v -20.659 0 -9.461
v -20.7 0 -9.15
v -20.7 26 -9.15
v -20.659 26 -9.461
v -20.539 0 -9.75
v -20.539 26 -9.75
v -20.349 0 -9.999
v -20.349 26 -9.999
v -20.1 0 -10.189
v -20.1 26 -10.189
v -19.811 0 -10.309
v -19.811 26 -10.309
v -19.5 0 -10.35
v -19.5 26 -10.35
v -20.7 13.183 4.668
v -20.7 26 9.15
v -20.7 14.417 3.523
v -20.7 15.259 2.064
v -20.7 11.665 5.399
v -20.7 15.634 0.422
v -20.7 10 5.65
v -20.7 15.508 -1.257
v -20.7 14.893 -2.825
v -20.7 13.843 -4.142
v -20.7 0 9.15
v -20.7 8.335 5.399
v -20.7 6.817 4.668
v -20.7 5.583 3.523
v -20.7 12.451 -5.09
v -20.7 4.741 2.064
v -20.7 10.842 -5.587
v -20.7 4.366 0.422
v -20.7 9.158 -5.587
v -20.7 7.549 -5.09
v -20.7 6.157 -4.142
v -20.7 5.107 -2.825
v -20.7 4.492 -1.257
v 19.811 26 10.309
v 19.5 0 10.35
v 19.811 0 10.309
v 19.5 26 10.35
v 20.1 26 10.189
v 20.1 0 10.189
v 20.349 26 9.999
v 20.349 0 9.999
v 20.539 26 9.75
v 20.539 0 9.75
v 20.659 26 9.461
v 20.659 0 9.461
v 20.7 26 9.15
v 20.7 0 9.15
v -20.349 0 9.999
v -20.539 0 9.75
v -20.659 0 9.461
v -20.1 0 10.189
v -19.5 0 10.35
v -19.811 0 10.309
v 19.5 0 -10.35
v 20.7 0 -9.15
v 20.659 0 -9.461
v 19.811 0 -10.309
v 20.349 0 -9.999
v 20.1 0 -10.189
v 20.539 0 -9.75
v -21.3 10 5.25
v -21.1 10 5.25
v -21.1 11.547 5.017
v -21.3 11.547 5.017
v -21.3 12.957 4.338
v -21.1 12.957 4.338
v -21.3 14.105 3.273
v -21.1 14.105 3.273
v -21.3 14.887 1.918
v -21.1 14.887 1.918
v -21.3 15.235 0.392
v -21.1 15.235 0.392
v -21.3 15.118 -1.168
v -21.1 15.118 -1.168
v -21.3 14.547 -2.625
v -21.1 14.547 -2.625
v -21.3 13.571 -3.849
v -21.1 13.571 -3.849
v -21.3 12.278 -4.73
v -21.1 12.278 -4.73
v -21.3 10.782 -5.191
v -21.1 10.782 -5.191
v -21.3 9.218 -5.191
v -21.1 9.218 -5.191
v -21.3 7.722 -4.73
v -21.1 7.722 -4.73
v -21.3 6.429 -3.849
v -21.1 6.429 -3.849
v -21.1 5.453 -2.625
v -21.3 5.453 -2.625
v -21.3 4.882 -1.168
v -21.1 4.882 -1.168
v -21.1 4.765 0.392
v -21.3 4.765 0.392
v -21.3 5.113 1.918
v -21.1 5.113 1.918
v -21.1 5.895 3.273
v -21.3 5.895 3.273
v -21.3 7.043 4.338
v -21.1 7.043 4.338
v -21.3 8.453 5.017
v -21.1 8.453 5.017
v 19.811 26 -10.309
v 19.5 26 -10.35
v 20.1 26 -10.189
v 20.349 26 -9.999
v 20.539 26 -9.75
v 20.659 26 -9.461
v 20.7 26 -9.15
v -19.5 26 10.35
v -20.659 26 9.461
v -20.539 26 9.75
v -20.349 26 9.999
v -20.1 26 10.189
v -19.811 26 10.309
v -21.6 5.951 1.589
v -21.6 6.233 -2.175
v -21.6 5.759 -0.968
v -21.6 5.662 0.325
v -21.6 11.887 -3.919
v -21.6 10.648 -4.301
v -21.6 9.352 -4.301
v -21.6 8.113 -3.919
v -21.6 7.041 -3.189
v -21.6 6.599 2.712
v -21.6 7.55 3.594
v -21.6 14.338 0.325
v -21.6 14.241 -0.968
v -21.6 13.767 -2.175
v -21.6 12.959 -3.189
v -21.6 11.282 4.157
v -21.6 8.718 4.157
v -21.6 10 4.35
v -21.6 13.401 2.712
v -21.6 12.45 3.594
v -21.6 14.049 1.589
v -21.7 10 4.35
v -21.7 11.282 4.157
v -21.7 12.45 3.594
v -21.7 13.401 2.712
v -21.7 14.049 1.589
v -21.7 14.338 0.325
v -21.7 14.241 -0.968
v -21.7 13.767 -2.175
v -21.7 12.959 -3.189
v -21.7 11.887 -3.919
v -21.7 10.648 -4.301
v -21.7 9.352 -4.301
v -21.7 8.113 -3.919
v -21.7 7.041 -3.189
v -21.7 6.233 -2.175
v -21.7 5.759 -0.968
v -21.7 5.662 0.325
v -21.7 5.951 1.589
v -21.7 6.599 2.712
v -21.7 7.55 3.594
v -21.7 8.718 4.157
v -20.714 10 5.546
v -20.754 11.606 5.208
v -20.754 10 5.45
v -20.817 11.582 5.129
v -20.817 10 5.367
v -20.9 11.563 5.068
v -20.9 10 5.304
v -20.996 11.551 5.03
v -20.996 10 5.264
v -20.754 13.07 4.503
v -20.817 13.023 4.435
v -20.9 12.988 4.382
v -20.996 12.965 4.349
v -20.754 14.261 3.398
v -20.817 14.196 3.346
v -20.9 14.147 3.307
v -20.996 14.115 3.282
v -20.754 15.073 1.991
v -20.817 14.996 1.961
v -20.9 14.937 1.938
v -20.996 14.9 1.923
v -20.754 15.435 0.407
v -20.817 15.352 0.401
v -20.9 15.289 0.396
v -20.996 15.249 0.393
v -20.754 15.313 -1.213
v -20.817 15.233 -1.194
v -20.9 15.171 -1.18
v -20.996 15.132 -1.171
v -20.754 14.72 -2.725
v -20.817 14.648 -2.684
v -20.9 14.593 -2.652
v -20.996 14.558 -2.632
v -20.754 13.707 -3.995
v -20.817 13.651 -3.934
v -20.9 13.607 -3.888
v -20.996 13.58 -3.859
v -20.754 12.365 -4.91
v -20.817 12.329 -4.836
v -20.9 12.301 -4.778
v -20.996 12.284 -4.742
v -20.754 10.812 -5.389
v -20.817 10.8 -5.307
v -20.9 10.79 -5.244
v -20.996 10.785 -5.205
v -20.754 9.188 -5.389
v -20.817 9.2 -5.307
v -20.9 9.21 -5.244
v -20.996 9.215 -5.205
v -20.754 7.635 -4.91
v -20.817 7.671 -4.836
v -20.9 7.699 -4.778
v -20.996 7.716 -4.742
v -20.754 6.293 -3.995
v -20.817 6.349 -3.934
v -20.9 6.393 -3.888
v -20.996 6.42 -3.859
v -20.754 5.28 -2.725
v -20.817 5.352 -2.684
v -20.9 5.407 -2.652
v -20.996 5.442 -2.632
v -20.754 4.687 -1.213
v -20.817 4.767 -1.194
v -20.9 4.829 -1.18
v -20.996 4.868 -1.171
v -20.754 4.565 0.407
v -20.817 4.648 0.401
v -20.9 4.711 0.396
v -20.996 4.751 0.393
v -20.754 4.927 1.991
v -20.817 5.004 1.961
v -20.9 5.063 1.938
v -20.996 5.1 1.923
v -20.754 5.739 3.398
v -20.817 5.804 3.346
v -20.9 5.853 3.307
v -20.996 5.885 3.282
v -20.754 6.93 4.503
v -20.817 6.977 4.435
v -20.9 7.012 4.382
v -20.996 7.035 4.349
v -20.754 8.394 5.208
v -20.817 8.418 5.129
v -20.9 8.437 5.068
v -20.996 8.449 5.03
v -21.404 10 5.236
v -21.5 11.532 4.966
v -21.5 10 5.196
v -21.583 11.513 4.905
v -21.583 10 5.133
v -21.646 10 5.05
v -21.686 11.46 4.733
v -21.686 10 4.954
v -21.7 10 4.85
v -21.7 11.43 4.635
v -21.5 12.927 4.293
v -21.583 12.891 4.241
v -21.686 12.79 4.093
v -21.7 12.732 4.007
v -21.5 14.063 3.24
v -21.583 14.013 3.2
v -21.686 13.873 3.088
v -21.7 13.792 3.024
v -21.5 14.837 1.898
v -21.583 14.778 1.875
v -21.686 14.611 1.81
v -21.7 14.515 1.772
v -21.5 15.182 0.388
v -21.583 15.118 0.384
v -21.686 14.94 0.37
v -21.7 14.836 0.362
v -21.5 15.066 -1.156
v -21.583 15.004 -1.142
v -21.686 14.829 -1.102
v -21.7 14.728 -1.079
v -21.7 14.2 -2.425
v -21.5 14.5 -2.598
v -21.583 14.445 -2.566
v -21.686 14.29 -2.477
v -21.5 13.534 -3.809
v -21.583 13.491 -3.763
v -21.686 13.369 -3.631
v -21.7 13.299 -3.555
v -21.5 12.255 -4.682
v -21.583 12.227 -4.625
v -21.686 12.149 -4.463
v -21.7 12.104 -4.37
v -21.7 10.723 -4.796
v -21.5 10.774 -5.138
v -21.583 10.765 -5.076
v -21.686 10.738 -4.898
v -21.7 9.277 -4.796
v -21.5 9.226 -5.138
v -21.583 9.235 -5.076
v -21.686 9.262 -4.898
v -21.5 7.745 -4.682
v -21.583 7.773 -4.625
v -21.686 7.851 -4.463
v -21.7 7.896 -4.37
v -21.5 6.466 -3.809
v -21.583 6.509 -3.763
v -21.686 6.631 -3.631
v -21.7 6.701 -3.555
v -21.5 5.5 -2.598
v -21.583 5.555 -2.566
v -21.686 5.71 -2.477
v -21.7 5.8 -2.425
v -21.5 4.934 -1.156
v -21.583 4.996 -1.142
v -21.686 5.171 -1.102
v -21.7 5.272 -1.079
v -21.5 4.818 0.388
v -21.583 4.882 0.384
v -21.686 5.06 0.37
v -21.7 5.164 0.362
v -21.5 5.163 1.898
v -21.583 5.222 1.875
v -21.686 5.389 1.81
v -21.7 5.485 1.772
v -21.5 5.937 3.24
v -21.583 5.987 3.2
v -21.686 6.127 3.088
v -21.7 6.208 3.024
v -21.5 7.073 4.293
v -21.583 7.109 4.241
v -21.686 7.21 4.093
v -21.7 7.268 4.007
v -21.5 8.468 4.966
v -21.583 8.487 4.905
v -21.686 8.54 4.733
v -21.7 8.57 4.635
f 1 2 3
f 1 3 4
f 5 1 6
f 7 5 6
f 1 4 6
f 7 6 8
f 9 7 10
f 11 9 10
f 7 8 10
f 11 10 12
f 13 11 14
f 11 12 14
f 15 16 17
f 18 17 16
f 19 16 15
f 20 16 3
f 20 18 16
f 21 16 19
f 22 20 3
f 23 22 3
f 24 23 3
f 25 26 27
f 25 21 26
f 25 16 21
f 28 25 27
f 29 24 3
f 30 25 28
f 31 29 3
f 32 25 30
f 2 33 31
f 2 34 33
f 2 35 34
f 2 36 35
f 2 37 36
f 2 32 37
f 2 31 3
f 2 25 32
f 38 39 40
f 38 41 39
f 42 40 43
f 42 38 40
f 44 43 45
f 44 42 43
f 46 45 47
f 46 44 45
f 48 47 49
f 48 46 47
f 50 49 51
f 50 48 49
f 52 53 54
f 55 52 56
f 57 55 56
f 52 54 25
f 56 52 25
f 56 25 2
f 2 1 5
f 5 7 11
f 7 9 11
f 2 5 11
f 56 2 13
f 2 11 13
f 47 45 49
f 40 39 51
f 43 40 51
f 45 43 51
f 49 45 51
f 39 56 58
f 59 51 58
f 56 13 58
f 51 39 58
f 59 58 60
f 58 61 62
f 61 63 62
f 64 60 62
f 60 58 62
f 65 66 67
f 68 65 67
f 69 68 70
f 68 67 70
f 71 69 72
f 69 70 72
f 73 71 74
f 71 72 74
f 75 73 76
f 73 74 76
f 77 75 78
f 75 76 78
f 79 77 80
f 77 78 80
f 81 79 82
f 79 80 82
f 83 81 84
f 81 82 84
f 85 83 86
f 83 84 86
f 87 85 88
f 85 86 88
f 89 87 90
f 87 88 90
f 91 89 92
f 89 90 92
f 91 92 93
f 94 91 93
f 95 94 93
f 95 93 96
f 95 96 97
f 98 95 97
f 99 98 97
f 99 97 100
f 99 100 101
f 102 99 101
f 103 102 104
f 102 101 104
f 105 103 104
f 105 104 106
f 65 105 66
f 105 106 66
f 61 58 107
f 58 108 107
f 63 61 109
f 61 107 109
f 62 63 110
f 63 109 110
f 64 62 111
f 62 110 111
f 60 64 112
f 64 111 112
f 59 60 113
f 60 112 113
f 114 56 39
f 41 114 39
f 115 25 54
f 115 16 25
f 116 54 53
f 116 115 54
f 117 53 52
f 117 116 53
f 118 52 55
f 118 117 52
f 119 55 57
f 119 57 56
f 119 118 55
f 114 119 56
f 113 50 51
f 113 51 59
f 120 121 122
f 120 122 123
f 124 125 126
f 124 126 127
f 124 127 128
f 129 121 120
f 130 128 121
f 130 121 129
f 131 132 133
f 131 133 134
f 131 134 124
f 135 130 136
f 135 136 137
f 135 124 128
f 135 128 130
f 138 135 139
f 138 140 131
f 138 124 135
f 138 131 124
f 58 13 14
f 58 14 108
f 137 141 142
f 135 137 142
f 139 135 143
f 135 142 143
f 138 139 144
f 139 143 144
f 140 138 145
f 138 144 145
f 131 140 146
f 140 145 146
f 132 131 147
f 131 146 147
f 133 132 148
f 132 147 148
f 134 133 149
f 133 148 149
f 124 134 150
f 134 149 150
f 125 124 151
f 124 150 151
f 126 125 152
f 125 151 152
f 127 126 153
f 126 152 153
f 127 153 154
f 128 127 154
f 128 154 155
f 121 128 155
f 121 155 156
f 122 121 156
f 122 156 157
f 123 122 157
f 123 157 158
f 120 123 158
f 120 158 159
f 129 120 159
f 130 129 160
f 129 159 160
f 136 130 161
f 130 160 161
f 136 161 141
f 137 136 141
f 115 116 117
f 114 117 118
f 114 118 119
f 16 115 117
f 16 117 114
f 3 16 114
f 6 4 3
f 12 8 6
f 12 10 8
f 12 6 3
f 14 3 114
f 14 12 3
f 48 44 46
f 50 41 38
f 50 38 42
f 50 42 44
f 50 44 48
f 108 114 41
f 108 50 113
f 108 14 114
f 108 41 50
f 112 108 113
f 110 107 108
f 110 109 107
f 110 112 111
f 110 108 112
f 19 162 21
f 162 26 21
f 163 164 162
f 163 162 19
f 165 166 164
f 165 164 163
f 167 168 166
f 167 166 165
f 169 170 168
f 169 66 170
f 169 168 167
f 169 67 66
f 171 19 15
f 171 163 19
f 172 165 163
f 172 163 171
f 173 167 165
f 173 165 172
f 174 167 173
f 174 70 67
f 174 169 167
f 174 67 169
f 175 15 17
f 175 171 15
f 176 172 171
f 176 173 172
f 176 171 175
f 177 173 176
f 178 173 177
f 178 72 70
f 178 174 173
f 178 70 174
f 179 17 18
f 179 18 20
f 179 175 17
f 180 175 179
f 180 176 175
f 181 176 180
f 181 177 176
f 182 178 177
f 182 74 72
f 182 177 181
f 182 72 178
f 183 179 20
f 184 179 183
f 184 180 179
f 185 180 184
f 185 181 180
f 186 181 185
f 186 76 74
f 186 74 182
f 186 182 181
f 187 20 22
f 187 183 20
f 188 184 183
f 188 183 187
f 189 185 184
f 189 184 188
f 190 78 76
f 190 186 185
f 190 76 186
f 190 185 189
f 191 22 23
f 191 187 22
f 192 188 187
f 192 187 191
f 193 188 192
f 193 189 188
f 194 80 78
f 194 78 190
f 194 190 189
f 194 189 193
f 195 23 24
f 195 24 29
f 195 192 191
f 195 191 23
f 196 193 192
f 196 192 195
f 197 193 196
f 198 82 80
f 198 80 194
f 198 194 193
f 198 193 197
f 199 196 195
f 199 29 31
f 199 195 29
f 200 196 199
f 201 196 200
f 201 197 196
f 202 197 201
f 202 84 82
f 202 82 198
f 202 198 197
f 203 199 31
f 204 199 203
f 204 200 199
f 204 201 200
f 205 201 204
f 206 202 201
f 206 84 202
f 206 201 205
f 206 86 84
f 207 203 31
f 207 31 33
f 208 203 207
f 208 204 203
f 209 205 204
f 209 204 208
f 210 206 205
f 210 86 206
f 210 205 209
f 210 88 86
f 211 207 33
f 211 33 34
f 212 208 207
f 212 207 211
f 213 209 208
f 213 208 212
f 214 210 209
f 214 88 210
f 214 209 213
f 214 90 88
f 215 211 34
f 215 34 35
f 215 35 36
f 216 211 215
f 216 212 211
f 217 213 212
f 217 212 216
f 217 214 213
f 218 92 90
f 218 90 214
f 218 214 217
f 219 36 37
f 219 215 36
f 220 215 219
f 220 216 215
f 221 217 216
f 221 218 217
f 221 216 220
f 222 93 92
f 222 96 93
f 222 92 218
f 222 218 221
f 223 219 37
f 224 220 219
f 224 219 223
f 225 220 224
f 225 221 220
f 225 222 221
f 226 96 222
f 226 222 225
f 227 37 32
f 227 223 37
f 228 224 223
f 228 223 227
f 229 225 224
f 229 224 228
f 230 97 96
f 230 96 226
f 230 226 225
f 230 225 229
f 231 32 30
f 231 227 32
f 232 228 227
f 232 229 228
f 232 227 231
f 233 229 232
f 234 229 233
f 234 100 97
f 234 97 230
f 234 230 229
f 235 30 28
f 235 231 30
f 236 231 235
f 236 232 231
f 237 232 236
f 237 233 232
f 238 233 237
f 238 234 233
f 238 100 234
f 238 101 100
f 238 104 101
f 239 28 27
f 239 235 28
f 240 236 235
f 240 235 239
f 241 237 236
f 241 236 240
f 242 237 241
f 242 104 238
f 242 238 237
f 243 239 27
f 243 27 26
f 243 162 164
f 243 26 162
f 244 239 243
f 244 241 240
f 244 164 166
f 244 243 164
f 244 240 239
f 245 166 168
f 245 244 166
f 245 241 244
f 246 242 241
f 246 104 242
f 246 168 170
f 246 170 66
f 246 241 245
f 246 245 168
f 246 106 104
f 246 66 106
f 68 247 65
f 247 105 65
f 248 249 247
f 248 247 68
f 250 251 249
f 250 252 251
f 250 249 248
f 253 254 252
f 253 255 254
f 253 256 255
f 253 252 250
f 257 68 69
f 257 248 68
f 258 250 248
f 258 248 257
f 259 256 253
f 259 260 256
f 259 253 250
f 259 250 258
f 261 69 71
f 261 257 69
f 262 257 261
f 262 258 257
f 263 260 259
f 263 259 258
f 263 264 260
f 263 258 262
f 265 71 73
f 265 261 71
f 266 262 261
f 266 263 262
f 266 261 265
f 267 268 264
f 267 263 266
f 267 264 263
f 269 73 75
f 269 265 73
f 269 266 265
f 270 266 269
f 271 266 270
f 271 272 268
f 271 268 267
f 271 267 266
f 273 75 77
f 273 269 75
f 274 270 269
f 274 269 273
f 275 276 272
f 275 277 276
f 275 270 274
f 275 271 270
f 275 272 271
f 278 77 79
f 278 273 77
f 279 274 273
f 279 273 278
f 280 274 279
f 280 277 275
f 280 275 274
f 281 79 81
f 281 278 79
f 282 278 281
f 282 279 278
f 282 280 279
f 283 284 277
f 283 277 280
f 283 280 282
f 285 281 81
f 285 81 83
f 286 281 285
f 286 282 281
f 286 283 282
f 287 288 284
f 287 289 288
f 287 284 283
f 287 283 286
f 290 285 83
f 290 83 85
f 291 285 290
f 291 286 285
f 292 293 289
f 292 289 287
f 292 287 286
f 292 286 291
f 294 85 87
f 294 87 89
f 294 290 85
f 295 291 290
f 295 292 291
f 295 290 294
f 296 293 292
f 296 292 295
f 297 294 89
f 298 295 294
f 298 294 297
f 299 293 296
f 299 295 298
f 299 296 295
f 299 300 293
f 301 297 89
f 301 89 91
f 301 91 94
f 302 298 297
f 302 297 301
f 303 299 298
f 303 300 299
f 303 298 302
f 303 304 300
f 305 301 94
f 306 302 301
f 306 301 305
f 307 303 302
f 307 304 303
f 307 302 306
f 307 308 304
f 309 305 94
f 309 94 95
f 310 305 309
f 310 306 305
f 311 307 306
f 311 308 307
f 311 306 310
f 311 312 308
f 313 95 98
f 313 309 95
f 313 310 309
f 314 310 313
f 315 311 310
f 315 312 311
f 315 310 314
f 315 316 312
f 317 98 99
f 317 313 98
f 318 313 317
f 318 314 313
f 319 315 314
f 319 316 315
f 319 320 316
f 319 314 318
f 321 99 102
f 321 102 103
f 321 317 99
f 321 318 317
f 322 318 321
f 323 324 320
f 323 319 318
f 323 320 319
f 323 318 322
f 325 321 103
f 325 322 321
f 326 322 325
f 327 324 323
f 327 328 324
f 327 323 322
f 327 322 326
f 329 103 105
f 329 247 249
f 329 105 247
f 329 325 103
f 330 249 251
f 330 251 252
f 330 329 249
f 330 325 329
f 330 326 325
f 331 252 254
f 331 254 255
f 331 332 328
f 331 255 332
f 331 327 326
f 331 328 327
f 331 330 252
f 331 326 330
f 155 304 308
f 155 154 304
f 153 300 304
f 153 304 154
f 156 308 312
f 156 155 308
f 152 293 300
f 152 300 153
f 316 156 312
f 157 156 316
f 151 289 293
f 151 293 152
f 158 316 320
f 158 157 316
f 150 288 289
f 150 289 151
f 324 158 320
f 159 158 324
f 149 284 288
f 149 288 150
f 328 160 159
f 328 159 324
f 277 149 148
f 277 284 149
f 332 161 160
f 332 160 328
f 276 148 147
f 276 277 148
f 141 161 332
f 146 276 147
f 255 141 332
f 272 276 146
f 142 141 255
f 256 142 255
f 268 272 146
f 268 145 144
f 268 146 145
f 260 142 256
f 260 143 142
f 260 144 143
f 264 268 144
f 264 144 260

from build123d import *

# Parameters (mm, degrees)
CROQUIS1_W              = 41.4
CROQUIS1_H              = 20.7
SALIENTE_EXTRUIR1_DEPTH = 26
CROQUIS3_R              = 5.25
SALIENTE_EXTRUIR2_DEPTH = 1
REDONDEO1_R             = 0.4
CROQUIS5_R              = 4.35
CORTAR_EXTRUIR1_DEPTH   = 0.1
REDONDEO2_R             = 1.2


with BuildPart() as part:
    # Croquis1 → Saliente-Extruir1 (new body)
    with BuildSketch(Plane(origin=(0, 0, 0), x_dir=(1, 0, 0), z_dir=(0, 1, 0))):
        Rectangle(CROQUIS1_W, CROQUIS1_H)
    extrude(amount=SALIENTE_EXTRUIR1_DEPTH)

    # Croquis3 → Saliente-Extruir2 (add)
    with BuildSketch(Plane.ZY.offset(20.7)):
        with Locations((0, 10)):
            Circle(CROQUIS3_R)
    extrude(amount=SALIENTE_EXTRUIR2_DEPTH)

    # Redondeo1
    redondeo1_edges = [part.edges().sort_by_distance(p)[0] for p in [
        (-20.7, 10, -5.25),
        (-21.7, 10, -5.25),
    ]]
    fillet(redondeo1_edges, radius=REDONDEO1_R)

    # Croquis5 → Cortar-Extruir1 (cut)
    with BuildSketch(Plane.ZY.offset(21.7)):
        with Locations((0, 10)):
            Circle(CROQUIS5_R)
    extrude(amount=-CORTAR_EXTRUIR1_DEPTH, mode=Mode.SUBTRACT)

    # Redondeo2
    redondeo2_edges = [part.edges().sort_by_distance(p)[0] for p in [
        (20.7, 13, 10.35),
        (-20.7, 13, 10.35),
        (-20.7, 13, -10.35),
        (20.7, 13, -10.35),
    ]]
    fillet(redondeo2_edges, radius=REDONDEO2_R)


solid = part.part
